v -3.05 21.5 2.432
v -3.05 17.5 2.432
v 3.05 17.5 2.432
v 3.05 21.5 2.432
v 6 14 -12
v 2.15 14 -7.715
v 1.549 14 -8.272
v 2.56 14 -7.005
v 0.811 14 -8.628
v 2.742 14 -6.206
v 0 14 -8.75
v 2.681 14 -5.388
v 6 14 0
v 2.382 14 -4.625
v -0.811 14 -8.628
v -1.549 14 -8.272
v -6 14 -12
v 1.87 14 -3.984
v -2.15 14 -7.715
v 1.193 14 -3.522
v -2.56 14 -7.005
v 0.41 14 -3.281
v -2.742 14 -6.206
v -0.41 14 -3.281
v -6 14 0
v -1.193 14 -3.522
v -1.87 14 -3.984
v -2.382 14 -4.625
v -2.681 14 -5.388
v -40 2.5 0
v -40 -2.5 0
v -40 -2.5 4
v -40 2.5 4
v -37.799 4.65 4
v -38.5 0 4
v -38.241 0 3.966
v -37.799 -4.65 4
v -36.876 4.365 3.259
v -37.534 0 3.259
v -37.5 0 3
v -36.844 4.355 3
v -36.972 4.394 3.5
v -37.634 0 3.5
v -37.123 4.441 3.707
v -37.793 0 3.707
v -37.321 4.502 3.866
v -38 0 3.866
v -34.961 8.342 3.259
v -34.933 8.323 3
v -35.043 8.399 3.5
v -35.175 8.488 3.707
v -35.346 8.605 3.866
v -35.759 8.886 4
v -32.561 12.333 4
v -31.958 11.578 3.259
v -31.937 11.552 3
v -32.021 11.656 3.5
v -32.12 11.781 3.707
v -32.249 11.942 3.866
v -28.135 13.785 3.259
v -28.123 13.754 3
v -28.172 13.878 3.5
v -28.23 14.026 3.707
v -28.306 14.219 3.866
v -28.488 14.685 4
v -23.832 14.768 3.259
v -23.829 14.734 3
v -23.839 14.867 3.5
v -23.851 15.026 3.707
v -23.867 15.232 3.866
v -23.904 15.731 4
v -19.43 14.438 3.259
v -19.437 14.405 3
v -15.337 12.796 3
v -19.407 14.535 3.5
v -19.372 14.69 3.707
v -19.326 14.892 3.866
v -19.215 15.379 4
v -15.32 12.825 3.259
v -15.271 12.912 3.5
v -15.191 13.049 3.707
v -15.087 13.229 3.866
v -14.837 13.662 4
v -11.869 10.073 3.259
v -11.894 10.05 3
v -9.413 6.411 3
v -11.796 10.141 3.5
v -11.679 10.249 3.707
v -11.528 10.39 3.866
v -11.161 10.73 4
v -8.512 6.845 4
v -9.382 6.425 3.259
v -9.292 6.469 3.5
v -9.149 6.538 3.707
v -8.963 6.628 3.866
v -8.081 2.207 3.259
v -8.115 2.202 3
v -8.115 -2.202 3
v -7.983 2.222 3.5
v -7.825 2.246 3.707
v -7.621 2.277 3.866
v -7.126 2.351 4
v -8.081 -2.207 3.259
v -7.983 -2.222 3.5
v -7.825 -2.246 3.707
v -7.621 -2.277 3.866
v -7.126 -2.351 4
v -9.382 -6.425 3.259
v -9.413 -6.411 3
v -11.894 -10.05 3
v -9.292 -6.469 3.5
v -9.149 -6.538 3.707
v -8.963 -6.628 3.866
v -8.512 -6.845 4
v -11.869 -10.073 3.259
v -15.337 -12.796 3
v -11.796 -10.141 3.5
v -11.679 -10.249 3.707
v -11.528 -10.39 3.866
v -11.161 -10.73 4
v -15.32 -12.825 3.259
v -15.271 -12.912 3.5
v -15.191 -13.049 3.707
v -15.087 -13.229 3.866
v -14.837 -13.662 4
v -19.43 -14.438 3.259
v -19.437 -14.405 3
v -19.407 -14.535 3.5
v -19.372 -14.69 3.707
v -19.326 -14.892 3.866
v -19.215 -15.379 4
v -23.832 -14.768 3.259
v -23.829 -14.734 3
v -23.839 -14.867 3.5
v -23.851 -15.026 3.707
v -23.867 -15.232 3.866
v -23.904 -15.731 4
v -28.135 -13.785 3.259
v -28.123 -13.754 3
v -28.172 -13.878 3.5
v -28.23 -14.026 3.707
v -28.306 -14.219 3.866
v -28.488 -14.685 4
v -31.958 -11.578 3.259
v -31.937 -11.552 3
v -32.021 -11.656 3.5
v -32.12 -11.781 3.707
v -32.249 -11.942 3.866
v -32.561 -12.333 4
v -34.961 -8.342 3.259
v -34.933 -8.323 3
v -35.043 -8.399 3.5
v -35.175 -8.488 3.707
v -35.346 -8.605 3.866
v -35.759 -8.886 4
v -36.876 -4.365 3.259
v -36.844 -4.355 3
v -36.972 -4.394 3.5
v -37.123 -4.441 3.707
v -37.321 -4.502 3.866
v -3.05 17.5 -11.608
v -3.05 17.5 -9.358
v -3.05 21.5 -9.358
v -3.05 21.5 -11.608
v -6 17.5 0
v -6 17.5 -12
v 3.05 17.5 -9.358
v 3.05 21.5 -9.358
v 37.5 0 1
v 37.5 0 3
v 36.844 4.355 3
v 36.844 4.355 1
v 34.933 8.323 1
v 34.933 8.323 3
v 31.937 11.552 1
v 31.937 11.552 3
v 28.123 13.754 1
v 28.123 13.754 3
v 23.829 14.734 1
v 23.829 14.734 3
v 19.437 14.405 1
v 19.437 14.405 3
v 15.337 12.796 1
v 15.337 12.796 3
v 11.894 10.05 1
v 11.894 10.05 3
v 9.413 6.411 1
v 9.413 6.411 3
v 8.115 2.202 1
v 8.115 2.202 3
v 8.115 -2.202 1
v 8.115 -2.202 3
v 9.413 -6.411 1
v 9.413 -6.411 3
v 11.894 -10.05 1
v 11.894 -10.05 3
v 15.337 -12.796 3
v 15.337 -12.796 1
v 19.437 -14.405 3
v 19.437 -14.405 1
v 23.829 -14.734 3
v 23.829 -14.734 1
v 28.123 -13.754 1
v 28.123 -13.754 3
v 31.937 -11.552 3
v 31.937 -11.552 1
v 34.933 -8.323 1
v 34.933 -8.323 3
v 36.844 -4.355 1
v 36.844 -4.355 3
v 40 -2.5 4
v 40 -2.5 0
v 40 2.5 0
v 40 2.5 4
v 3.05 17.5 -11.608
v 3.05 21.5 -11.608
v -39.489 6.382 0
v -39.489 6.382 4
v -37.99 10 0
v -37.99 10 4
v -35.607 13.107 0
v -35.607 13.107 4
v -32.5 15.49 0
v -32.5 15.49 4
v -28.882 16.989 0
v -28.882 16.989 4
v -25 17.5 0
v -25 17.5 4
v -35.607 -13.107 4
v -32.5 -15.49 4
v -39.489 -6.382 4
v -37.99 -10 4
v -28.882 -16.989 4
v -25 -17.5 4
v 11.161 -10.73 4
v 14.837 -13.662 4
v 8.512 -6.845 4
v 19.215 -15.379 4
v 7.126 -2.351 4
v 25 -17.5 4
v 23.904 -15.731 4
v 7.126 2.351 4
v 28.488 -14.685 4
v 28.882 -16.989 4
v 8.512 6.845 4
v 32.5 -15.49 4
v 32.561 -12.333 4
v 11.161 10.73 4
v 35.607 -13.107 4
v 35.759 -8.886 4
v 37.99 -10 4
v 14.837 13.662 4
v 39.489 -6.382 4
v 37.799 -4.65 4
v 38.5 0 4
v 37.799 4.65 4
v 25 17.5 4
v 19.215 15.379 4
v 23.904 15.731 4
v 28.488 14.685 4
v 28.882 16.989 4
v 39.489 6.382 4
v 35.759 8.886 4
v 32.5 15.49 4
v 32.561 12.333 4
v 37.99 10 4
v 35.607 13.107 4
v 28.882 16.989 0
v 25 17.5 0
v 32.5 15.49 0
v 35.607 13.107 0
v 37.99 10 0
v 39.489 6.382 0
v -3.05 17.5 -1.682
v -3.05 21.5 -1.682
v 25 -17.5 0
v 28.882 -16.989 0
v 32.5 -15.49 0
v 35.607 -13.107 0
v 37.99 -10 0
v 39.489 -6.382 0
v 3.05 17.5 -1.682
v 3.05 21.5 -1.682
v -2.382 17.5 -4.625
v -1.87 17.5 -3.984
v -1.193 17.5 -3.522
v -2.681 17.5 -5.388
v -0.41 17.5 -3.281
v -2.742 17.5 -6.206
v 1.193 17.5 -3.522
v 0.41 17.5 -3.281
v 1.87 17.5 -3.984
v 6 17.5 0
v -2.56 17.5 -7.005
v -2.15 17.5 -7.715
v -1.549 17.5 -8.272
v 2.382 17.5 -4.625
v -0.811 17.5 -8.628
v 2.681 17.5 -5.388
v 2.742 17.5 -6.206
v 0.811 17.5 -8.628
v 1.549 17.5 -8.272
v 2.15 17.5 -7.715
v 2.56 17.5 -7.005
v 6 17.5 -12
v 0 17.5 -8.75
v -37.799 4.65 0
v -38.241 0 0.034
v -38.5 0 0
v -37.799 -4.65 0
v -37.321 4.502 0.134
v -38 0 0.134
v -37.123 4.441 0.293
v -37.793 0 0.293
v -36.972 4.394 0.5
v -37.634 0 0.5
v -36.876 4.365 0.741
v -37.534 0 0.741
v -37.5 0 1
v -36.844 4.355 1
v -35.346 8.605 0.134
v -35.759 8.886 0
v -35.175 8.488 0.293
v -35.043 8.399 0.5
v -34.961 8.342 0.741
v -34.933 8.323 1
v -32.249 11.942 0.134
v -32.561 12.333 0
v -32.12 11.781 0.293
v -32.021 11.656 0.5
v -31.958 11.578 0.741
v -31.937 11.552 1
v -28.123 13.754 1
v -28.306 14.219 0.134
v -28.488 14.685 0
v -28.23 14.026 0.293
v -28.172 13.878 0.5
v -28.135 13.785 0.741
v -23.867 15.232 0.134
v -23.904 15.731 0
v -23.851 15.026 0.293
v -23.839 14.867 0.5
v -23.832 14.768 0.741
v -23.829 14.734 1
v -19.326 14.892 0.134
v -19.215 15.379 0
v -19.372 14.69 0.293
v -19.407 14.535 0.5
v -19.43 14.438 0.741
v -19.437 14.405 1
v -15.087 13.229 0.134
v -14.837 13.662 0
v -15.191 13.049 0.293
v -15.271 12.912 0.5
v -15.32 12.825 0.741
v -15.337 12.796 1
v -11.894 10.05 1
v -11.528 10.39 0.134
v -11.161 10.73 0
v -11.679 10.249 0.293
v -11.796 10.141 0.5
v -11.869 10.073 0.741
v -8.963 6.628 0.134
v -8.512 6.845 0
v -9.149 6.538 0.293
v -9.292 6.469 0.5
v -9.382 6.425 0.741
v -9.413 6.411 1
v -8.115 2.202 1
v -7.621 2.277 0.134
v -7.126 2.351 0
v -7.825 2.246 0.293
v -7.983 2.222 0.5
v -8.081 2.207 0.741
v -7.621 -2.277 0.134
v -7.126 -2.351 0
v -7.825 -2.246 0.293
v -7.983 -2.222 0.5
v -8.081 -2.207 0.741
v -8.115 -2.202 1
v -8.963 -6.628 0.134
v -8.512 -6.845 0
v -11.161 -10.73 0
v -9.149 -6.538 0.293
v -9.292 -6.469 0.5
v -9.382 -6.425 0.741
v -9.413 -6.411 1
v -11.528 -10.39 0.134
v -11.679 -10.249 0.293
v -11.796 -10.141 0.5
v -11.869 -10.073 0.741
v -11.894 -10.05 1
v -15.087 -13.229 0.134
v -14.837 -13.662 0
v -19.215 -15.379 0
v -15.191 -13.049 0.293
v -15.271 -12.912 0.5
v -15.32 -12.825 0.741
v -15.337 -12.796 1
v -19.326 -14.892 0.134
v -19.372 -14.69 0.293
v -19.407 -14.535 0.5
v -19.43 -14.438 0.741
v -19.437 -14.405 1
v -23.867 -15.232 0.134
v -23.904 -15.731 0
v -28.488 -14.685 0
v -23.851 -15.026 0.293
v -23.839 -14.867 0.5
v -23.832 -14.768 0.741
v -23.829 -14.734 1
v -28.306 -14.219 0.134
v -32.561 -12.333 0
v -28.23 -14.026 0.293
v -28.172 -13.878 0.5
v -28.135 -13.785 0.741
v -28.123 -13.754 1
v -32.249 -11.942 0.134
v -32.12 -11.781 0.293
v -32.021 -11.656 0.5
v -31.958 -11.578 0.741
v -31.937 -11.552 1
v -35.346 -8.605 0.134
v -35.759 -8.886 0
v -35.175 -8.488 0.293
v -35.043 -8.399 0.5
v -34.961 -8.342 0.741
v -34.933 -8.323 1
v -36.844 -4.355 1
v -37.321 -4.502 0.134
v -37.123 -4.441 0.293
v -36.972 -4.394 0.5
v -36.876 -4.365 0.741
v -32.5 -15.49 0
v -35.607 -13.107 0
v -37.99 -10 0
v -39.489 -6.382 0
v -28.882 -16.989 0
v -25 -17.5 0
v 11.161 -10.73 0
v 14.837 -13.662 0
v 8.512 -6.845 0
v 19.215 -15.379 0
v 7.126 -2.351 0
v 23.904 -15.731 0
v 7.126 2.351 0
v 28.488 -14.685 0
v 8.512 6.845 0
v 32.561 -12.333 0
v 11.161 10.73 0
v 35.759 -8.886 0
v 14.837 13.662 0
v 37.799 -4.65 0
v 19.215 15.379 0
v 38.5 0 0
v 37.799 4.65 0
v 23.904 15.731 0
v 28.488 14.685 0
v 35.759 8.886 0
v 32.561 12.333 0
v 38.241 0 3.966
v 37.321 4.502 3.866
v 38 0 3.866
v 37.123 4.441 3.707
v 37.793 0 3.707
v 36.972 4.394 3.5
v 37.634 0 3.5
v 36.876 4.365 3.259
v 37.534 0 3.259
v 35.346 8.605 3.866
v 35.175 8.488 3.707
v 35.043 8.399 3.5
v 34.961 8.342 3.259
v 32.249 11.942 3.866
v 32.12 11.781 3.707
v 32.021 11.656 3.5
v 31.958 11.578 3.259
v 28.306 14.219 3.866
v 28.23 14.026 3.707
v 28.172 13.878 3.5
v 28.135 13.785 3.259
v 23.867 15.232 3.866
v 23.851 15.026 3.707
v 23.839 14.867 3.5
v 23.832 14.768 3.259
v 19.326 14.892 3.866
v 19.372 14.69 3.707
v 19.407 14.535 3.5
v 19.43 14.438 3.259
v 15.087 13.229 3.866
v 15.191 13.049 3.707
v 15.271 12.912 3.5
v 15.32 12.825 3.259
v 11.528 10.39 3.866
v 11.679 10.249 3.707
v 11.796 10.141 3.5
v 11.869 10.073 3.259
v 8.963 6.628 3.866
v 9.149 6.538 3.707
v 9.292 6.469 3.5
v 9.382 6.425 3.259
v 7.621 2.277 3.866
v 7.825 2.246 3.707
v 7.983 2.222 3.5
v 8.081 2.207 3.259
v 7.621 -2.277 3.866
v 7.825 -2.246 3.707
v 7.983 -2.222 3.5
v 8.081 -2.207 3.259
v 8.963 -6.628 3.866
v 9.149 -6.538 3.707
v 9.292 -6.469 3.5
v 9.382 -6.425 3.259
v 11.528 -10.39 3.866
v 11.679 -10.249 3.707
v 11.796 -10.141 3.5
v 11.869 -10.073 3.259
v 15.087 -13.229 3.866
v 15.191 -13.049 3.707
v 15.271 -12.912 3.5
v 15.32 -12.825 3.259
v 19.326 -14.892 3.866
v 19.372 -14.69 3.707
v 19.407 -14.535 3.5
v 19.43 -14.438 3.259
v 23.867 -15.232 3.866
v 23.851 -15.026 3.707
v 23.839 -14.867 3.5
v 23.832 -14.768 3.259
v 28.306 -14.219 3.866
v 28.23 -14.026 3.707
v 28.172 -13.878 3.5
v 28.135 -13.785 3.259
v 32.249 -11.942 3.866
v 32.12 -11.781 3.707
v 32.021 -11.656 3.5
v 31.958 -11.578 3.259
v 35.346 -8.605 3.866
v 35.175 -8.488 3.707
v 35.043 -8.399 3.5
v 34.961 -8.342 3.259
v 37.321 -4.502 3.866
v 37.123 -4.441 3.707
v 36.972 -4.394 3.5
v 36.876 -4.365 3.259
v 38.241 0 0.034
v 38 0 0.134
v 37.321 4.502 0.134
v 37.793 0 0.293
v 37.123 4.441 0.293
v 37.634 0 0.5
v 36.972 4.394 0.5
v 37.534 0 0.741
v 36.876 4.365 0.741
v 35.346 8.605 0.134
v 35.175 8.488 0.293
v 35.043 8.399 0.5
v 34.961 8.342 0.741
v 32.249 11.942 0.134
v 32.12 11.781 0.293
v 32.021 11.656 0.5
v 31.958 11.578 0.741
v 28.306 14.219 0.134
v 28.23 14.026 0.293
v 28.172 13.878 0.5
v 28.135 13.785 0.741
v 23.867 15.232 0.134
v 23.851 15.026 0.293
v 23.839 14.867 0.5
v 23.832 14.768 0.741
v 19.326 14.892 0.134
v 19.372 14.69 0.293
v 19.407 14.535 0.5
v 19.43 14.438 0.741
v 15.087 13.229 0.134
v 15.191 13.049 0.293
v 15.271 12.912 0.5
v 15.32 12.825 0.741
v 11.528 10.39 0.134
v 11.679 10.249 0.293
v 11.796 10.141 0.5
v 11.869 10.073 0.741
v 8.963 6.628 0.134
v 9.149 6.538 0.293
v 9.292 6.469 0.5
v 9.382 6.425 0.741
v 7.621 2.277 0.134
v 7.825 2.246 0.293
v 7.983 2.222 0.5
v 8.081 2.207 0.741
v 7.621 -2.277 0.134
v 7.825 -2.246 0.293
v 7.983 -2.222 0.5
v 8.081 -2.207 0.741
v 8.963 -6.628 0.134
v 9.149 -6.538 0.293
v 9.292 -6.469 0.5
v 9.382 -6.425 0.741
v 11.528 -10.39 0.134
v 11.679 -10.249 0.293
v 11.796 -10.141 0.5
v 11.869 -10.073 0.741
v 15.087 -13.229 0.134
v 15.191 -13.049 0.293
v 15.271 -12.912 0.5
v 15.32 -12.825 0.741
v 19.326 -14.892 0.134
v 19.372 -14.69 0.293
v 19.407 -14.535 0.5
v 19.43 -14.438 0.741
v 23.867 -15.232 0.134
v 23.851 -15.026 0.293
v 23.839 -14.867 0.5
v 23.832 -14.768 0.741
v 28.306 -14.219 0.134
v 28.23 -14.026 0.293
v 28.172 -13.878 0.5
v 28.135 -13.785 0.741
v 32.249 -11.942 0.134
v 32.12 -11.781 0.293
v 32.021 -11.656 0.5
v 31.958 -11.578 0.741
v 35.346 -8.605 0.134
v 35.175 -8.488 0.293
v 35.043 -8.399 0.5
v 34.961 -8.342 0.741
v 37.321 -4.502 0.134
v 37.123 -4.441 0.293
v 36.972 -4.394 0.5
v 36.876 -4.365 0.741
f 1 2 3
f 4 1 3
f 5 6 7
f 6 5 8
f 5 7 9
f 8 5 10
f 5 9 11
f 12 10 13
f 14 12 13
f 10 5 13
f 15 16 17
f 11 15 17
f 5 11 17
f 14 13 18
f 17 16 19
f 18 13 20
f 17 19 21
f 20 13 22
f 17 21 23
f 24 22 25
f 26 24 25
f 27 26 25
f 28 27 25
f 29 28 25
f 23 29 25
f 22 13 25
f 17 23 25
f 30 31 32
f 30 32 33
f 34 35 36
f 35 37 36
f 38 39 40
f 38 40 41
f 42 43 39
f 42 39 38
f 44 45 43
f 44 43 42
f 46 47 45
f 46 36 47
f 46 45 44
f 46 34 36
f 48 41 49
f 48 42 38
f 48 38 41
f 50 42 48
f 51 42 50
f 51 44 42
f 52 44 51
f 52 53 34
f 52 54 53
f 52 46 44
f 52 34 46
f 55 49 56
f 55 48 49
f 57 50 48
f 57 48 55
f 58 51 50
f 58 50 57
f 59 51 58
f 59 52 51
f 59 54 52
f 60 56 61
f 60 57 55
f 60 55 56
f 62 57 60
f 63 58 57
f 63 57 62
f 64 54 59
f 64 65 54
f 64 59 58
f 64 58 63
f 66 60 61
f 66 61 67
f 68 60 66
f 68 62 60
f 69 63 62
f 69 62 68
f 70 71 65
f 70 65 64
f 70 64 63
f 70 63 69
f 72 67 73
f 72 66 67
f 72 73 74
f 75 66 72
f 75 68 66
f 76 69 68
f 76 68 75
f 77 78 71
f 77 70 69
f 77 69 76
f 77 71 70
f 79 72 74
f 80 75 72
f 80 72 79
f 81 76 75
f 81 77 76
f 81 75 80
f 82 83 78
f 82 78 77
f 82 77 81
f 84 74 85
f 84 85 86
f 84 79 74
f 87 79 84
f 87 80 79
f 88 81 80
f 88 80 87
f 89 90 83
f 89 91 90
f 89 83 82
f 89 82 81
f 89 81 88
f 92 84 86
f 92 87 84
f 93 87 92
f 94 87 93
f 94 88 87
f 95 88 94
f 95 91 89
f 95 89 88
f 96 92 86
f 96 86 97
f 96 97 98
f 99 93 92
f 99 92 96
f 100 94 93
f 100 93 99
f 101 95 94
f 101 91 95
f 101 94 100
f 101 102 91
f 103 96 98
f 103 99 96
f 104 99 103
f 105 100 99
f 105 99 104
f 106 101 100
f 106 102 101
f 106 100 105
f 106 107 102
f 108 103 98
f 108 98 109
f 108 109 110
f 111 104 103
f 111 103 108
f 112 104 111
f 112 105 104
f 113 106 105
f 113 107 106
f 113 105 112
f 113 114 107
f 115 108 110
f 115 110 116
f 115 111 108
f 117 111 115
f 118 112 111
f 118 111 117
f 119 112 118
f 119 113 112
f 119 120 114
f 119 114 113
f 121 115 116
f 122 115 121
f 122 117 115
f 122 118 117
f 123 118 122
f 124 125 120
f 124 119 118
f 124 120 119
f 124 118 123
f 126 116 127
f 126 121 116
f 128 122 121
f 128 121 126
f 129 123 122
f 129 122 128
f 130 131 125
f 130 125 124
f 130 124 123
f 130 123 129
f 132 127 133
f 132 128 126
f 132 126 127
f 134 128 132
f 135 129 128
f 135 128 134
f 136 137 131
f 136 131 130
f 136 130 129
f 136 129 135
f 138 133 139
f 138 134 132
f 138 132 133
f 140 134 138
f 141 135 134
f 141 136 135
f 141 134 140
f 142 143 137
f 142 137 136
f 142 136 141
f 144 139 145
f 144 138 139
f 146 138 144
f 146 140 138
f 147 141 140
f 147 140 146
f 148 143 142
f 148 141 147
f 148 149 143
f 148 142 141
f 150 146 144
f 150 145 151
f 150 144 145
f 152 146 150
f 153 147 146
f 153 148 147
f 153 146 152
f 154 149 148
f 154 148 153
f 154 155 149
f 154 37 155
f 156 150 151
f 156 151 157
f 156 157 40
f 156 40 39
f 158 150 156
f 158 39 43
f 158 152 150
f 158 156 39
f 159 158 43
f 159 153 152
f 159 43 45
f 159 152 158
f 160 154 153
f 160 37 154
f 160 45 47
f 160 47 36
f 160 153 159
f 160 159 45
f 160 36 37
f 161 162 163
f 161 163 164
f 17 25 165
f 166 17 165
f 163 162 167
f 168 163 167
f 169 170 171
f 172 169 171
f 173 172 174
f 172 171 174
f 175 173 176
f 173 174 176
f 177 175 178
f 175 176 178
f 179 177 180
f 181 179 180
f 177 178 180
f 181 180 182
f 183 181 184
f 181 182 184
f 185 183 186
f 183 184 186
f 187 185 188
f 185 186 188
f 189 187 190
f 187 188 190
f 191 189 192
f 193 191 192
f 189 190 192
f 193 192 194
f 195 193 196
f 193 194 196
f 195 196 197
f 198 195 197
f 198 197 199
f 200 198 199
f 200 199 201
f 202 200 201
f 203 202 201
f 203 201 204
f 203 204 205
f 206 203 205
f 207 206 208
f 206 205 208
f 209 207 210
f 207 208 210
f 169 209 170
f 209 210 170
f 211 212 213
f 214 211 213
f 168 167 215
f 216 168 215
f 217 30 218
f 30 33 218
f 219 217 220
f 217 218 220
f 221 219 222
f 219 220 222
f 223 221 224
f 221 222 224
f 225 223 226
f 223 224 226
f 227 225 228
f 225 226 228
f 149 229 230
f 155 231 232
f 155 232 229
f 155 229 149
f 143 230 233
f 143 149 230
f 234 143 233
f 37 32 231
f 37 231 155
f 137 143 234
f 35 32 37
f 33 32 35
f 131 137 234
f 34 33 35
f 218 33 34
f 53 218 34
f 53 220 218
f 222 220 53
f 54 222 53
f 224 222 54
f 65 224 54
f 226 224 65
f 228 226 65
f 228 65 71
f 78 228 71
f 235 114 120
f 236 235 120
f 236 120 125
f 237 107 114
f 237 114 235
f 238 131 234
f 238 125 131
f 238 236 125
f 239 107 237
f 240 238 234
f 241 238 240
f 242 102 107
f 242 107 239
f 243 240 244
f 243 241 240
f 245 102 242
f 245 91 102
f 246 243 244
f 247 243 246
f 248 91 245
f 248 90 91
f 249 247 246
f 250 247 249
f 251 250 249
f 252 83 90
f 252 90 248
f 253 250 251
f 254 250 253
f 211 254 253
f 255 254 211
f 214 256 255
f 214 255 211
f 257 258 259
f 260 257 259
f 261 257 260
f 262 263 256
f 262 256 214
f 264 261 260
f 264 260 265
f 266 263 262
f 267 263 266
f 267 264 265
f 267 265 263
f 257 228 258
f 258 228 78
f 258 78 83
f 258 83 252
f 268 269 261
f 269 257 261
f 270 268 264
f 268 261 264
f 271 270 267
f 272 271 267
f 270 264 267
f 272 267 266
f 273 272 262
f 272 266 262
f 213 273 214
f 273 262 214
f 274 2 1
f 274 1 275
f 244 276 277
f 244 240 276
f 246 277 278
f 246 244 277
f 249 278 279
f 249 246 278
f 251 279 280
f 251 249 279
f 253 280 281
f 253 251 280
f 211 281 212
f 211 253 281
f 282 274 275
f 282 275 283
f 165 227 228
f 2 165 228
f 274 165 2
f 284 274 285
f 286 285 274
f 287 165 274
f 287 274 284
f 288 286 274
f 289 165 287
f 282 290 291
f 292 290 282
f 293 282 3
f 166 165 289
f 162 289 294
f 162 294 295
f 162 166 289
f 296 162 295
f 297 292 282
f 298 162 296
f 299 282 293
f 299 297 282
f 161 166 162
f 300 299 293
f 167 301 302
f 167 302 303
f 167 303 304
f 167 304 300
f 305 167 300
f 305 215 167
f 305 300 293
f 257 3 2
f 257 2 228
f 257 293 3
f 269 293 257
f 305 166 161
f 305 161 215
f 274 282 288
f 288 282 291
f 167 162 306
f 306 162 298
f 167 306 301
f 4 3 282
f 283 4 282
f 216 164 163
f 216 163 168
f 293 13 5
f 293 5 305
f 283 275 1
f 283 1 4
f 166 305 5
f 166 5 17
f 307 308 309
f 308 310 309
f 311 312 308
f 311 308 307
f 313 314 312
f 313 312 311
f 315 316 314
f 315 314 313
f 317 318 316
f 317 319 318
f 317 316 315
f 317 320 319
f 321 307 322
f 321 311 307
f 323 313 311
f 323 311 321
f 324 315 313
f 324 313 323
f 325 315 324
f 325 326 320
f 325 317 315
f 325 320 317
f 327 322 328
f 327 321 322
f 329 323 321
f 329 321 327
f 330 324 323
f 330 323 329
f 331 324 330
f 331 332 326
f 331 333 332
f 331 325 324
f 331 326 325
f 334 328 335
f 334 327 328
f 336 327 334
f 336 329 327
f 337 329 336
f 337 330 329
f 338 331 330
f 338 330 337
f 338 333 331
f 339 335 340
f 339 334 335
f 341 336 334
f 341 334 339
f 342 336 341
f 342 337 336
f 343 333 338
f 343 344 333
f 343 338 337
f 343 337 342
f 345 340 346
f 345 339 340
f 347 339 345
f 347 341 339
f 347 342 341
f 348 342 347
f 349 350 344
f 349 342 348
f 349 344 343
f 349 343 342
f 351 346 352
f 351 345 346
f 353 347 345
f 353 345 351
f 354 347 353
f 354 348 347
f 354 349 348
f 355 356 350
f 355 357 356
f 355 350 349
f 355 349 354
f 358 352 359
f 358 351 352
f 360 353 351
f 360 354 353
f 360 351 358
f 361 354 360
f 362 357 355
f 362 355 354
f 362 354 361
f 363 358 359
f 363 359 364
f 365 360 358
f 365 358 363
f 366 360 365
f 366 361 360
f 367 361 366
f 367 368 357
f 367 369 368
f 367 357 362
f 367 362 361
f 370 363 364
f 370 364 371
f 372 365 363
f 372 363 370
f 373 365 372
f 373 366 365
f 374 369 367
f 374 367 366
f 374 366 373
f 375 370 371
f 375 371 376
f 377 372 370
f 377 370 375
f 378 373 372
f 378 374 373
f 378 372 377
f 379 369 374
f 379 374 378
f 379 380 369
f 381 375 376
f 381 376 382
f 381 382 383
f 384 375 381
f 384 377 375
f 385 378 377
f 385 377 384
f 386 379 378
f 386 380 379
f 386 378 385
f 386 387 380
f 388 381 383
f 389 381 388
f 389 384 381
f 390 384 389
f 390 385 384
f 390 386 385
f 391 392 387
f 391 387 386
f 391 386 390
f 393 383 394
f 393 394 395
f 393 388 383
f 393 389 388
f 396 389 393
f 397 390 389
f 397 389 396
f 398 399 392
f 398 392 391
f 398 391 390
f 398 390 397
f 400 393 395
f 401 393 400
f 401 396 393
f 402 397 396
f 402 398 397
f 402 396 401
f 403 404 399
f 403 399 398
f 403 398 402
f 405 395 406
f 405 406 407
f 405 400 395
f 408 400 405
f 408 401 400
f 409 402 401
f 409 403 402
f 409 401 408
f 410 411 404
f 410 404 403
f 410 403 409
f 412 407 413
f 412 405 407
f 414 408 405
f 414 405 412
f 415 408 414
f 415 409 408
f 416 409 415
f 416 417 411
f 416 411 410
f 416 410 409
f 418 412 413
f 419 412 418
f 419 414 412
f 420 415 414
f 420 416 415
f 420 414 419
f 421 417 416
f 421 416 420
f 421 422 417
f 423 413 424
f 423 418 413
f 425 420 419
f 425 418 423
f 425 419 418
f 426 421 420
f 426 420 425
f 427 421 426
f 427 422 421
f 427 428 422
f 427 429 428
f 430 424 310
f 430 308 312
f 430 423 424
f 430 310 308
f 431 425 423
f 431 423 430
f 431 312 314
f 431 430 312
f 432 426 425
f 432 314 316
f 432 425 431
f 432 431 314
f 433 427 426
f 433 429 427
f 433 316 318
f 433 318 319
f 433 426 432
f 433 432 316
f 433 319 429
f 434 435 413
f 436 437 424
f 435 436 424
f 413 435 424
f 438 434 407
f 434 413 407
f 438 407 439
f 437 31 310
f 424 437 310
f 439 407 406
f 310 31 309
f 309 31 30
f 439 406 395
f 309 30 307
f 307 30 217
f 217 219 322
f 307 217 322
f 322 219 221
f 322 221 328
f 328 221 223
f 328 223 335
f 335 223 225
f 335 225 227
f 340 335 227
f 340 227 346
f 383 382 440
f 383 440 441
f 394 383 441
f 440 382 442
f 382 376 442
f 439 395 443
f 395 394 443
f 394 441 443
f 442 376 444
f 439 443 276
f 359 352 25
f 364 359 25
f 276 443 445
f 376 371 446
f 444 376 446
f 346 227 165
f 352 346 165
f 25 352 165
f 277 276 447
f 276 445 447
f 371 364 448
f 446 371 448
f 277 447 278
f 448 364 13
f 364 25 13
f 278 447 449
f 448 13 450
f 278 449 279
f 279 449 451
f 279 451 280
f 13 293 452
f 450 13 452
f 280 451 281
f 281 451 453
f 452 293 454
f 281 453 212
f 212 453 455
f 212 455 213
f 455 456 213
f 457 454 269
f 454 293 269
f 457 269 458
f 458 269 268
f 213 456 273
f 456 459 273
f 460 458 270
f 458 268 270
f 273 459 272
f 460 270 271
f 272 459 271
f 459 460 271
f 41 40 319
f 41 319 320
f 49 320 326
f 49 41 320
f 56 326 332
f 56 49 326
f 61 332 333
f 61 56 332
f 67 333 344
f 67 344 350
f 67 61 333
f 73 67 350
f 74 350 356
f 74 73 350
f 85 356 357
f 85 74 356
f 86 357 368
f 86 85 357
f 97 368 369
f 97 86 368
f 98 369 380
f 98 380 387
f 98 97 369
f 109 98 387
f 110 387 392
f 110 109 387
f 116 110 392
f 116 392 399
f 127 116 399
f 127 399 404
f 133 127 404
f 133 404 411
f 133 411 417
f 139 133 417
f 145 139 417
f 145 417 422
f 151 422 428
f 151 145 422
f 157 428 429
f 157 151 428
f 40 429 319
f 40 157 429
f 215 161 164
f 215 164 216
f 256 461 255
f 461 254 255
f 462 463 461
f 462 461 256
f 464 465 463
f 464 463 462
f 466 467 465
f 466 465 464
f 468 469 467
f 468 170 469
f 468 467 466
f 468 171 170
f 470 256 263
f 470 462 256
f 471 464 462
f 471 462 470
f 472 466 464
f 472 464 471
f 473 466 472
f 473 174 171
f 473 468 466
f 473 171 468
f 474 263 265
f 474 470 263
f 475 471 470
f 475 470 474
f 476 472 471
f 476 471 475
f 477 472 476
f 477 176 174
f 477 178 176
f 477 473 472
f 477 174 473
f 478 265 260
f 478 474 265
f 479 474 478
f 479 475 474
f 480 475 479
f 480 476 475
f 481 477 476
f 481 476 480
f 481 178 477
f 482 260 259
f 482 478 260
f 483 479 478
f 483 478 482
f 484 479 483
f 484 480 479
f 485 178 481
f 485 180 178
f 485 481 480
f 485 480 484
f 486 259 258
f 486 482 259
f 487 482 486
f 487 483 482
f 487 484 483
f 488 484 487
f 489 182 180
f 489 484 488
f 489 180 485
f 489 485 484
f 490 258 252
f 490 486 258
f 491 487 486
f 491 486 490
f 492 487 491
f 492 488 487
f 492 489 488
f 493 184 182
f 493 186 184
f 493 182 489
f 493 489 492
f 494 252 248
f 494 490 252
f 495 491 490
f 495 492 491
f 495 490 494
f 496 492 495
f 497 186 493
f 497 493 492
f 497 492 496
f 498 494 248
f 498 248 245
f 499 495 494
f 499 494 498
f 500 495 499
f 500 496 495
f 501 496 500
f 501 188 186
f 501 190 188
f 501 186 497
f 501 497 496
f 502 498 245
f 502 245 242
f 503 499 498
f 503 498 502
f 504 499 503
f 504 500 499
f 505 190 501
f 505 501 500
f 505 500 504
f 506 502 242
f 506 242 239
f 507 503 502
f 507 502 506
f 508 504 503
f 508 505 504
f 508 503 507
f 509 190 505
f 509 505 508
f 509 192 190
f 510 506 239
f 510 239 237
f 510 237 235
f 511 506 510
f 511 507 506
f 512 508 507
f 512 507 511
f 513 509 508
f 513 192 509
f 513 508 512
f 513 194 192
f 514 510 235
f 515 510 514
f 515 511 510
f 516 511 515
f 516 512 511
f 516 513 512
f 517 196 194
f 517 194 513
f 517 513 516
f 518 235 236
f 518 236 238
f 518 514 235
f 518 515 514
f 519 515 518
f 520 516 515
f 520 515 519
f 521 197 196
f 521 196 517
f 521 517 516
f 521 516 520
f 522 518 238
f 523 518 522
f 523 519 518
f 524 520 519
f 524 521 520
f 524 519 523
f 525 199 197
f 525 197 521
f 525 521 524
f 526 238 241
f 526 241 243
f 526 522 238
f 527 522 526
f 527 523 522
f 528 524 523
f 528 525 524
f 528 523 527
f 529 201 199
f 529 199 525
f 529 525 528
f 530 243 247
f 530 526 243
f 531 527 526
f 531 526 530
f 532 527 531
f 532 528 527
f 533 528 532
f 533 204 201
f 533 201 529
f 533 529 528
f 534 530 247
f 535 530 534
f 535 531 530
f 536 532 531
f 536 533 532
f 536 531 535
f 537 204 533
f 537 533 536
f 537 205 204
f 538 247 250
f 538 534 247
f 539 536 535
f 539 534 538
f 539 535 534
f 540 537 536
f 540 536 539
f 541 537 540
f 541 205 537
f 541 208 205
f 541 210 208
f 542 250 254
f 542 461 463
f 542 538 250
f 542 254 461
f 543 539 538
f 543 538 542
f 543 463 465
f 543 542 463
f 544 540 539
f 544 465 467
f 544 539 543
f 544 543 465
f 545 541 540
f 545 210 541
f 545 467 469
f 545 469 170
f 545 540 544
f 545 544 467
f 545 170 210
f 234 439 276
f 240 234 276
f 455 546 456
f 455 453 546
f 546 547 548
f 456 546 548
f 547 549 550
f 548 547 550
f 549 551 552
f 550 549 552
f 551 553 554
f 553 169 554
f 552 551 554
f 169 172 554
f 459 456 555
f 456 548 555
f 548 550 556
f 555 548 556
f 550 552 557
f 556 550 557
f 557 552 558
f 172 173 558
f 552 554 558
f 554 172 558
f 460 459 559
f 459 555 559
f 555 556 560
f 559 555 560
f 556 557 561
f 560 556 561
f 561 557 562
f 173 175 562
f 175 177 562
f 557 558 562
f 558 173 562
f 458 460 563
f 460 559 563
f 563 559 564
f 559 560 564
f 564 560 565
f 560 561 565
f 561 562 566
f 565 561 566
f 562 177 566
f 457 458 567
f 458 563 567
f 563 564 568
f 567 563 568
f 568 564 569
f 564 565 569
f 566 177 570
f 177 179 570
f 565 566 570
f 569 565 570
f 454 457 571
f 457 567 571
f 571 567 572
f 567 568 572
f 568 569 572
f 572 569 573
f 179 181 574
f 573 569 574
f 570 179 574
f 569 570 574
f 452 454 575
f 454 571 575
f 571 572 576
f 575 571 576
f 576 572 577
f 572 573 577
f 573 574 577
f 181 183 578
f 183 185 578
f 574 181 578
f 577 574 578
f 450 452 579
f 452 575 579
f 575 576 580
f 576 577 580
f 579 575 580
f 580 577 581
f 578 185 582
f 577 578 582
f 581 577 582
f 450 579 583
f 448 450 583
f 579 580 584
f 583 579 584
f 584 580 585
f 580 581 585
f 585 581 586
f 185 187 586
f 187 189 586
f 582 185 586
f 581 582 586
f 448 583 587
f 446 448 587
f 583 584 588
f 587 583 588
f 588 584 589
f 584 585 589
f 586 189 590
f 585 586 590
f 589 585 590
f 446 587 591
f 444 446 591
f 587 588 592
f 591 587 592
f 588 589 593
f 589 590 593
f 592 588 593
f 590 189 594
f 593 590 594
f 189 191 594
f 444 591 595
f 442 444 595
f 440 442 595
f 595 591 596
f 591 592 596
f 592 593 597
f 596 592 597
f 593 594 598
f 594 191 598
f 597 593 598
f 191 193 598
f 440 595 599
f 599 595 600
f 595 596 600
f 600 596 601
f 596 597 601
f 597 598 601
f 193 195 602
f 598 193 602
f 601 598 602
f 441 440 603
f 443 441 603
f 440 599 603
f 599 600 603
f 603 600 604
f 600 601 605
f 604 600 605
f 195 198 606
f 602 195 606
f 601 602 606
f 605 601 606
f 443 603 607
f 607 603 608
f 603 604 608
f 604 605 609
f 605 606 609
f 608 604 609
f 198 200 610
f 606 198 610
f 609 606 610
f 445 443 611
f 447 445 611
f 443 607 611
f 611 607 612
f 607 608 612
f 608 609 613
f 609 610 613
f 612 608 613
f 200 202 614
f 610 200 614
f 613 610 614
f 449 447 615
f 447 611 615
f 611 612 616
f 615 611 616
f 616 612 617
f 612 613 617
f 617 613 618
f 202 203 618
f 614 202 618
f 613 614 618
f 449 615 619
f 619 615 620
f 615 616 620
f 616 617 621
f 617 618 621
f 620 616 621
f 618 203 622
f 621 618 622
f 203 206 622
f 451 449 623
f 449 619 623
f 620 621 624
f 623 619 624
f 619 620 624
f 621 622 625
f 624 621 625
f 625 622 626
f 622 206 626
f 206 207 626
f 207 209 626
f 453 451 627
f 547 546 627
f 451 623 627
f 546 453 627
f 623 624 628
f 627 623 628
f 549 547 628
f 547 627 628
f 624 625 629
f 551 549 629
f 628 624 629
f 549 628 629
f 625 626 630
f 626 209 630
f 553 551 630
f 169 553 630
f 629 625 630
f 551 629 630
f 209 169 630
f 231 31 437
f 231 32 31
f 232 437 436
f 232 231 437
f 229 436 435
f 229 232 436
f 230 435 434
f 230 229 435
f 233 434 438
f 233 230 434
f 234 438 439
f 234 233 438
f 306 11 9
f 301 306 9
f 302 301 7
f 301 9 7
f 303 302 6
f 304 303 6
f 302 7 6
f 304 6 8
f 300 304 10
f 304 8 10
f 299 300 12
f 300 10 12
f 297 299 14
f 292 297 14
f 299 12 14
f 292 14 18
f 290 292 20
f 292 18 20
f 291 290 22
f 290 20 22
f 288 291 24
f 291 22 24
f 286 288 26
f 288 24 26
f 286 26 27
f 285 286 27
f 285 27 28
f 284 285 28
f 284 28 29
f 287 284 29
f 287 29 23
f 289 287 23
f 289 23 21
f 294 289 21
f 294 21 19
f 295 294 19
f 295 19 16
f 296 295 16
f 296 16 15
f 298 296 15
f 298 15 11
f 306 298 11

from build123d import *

# Parameters (mm, degrees)
SKETCH1_W            = 80
SKETCH1_H            = 35
BOSS_EXTRUDE1_DEPTH  = 4
SKETCH2_R            = 14.775
CUT_EXTRUDE1_DEPTH   = 4
FILLET2_R            = 15
SKETCH3_W            = 12
SKETCH3_H            = 3.5
BOSS_EXTRUDE2_DEPTH  = 12
SKETCH4_R            = 2.75
CUT_EXTRUDE2_DEPTH   = 5
FILLET4_R            = 1
FILLET4_OF_MIRROR4_R = 1
FILLET5_R            = 15
SKETCH6_W            = 6.1
SKETCH6_H            = 2.250320618
SKETCH6_H_2          = 4.114705986
BOSS_EXTRUDE3_DEPTH  = 4


with BuildPart() as part:
    # Sketch1 → Boss-Extrude1 (new body)
    with BuildSketch(Plane.XY):
        Rectangle(SKETCH1_W, SKETCH1_H)
    extrude(amount=BOSS_EXTRUDE1_DEPTH)

    # Sketch2 → Cut-Extrude1 (cut)
    with BuildSketch(Plane.XY.offset(4)):
        with Locations((22.725, 0)):
            Circle(SKETCH2_R)
    cut_extrude1 = extrude(amount=-CUT_EXTRUDE1_DEPTH, mode=Mode.SUBTRACT)

    # Fillet2
    fillet2_edges = [part.edges().sort_by_distance(p)[0] for p in [
        (40, -17.5, 2),
        (-40, -17.5, 2),
    ]]
    fillet(fillet2_edges, radius=FILLET2_R)

    # Sketch3 → Boss-Extrude2 (add)
    with BuildSketch(Plane(origin=(0, 0, 0), x_dir=(-1, 0, 0), z_dir=(0, 0, -1))):
        with Locations((0, 15.75)):
            Rectangle(SKETCH3_W, SKETCH3_H)
    extrude(amount=BOSS_EXTRUDE2_DEPTH)

    # Sketch4 → Cut-Extrude2 (cut)
    with BuildSketch(Plane.XZ.offset(-14)):
        with Locations(Location((0, -6, 0), (0, 0, 270))):
            Circle(SKETCH4_R)
    extrude(amount=-CUT_EXTRUDE2_DEPTH, mode=Mode.SUBTRACT)

    # Fillet4
    fillet4_edges = [part.edges().sort_by_distance(p)[0] for p in [
        (7.95, 0, 0),
        (7.95, 0, 4),
    ]]
    fillet(fillet4_edges, radius=FILLET4_R)

    # Mirror4: Cut-Extrude1 across plane
    add(cut_extrude1.mirror(Plane(origin=(0, 0, 0), x_dir=(0, 0, 1), z_dir=(1, 0, 0))), mode=Mode.SUBTRACT)

    # Fillet4 of Mirror4
    fillet4_of_mirror4_edges = [part.edges().sort_by_distance(p)[0] for p in [
        (-7.95, 0, 0),
        (-7.95, 0, 4),
    ]]
    fillet(fillet4_of_mirror4_edges, radius=FILLET4_OF_MIRROR4_R)

    # Fillet5
    fillet5_edges = [part.edges().sort_by_distance(p)[0] for p in [
        (-40, 17.5, 2),
        (40, 17.5, 2),
    ]]
    fillet(fillet5_edges, radius=FILLET5_R)

    # Sketch6 → Boss-Extrude3 (add)
    with BuildSketch(Plane(origin=(0, 17.5, 0), x_dir=(1, 0, 0), z_dir=(0, 1, 0))):
        with Locations((0, 10.482941872)):
            Rectangle(SKETCH6_W, SKETCH6_H)
        with Locations((0, -0.375)):
            Rectangle(SKETCH6_W, SKETCH6_H_2)
    extrude(amount=BOSS_EXTRUDE3_DEPTH)


solid = part.part
